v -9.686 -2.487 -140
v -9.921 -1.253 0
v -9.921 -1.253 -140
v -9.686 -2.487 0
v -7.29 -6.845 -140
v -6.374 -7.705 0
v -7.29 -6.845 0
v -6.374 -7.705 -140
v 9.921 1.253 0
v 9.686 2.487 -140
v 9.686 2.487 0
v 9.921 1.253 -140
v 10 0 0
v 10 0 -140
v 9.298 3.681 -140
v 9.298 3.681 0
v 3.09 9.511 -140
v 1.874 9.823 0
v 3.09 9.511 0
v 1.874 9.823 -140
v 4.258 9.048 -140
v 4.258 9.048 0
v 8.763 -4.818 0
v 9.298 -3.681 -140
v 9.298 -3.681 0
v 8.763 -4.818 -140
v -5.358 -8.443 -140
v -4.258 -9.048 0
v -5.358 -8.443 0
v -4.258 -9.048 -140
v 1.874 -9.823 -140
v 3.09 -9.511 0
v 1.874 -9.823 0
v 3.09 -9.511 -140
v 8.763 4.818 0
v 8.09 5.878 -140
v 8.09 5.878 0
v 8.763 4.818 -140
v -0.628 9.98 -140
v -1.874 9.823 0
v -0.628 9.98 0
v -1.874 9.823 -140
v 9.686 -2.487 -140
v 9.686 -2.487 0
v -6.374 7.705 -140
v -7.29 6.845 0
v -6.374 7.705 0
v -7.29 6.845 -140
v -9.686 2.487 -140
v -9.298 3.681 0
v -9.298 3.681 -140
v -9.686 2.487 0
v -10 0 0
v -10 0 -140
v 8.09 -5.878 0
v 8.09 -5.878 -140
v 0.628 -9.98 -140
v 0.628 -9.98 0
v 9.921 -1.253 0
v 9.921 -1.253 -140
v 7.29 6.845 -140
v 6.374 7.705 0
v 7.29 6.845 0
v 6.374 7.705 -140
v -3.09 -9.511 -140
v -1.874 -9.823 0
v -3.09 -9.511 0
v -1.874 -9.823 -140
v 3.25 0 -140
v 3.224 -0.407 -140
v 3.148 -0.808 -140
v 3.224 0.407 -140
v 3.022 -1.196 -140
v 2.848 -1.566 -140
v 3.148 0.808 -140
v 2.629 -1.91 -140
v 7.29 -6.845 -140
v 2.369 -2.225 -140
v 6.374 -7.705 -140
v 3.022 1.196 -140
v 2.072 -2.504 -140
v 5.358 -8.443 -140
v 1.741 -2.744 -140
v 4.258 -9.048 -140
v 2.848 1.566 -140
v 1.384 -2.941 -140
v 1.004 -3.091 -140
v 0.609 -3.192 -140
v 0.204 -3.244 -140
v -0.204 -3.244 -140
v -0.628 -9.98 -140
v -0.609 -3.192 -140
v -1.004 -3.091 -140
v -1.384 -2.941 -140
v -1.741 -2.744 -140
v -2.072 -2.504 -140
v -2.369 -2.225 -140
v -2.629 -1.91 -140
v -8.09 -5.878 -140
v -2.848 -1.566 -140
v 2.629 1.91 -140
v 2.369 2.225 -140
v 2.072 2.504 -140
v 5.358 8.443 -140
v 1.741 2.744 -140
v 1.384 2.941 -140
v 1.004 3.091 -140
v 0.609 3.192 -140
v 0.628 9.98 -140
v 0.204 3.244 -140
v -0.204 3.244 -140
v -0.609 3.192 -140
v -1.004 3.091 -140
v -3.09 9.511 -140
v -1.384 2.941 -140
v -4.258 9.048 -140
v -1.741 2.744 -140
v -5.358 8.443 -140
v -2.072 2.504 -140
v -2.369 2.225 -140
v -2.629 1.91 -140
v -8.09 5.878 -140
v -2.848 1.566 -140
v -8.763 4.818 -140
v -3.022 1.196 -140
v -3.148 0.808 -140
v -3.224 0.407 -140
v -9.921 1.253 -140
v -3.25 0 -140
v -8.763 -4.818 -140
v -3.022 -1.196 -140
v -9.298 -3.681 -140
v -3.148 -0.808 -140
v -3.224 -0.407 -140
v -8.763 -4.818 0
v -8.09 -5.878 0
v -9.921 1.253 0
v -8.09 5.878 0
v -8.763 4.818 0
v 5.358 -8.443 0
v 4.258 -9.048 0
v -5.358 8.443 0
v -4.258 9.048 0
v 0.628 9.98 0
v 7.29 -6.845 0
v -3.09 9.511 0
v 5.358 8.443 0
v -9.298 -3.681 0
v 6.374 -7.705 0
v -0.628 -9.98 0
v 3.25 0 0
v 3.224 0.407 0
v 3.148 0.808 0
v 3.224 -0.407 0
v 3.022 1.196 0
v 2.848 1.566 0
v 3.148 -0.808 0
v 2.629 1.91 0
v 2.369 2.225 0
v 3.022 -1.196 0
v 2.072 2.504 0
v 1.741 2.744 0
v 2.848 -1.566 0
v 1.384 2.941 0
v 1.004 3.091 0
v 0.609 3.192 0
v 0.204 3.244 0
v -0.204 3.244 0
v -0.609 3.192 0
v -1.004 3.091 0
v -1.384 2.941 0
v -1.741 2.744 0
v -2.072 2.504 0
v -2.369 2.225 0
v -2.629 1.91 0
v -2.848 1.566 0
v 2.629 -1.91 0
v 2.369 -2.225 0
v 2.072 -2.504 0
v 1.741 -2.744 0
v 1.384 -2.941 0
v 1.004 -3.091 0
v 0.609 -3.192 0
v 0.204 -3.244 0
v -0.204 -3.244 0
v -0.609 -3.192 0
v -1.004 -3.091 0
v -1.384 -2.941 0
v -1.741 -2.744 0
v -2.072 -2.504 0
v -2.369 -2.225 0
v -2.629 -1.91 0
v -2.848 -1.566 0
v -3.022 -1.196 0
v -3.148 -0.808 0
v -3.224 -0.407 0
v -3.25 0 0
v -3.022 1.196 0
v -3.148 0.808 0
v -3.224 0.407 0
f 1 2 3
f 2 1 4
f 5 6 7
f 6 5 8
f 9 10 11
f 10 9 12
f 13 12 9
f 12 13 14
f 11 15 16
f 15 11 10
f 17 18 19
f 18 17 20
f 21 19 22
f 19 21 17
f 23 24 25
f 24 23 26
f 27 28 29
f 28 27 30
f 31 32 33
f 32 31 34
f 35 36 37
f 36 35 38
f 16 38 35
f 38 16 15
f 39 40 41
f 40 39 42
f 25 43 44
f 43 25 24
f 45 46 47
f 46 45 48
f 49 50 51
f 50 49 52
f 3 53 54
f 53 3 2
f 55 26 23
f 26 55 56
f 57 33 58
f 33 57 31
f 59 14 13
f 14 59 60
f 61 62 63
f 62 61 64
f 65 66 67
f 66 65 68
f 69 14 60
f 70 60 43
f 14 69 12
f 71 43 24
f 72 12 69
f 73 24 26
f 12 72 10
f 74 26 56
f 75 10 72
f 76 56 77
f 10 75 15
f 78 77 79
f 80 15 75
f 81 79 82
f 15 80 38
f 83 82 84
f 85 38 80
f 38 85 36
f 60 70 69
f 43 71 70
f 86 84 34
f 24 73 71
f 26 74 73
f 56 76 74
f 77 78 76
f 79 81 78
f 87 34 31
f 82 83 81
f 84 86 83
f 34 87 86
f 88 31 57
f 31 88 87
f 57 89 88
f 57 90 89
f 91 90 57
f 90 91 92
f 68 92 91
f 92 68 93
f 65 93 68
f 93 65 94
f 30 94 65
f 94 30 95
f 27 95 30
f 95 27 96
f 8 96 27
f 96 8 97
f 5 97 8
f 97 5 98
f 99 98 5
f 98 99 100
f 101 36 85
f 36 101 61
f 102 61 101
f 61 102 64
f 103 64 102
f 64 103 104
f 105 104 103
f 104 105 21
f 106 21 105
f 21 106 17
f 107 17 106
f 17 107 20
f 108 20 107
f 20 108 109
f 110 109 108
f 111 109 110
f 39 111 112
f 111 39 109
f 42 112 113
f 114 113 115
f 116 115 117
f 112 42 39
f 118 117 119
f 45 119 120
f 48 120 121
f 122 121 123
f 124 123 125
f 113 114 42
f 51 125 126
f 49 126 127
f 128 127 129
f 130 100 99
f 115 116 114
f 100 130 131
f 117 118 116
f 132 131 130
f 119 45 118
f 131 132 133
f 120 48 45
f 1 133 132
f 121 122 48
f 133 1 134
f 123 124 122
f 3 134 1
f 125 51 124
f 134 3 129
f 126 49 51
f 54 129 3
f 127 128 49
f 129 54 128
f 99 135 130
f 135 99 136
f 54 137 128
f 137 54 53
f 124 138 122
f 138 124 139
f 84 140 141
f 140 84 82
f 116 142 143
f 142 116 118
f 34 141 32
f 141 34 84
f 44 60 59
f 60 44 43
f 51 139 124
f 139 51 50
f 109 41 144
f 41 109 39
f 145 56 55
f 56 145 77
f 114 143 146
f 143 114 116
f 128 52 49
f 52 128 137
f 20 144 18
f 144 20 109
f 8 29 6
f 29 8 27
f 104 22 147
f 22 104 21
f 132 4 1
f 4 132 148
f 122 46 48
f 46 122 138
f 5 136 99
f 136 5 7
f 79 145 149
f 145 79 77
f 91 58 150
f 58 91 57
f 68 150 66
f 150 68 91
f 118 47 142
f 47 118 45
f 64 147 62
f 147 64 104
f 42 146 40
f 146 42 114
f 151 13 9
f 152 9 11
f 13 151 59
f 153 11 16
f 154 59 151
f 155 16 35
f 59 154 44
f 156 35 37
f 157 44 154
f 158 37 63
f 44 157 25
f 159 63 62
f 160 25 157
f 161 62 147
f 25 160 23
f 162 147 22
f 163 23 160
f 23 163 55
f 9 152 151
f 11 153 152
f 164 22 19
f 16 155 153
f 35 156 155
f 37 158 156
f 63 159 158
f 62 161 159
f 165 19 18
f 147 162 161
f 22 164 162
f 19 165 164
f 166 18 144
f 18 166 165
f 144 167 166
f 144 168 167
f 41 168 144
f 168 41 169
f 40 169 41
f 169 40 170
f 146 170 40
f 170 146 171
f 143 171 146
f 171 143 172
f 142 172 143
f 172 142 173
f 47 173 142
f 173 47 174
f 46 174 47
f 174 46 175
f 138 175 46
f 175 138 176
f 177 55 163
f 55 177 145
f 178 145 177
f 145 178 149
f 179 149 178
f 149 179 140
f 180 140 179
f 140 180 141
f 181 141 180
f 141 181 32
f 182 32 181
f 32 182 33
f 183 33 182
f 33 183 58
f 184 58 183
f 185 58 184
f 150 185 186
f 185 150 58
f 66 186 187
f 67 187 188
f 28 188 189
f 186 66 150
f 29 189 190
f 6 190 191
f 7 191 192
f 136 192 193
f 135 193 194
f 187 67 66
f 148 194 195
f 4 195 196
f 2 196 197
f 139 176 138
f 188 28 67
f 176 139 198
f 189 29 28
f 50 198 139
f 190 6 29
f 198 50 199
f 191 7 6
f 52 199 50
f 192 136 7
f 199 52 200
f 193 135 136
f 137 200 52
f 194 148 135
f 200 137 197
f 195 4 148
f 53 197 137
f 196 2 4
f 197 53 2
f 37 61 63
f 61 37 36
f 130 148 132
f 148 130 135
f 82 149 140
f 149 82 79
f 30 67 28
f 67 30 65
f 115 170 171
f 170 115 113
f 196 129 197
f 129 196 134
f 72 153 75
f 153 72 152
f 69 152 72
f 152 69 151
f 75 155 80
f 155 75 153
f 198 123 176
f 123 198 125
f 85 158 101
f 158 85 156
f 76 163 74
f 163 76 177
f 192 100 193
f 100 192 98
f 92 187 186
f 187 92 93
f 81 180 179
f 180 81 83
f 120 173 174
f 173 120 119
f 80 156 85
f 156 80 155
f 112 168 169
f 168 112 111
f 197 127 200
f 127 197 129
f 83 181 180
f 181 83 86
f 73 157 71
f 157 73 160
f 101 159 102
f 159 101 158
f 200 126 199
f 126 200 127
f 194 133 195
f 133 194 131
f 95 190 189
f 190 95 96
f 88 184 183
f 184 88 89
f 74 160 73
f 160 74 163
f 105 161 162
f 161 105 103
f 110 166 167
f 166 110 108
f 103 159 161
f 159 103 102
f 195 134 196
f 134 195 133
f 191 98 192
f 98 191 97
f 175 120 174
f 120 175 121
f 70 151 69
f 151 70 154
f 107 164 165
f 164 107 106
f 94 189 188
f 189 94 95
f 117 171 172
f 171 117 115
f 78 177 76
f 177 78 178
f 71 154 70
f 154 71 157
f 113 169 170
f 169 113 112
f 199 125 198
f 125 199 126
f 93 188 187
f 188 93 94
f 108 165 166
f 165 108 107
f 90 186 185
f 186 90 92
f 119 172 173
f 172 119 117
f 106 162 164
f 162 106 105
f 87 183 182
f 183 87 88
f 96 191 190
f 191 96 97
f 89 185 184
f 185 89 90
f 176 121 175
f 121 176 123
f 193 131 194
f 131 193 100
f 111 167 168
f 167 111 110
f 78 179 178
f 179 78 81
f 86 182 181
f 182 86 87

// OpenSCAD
$fn = 50;


difference() {
	union() {
		translate(v = [0, 0, -140.0000000000]) {
			cylinder(h = 140, r = 10.0000000000);
		}
		cylinder(h = 0, r = 13.0000000000);
	}
	union() {
		#translate(v = [0, 0, -140]) {
			cylinder(h = 140, r = 3.2500000000);
		}
	}
}
